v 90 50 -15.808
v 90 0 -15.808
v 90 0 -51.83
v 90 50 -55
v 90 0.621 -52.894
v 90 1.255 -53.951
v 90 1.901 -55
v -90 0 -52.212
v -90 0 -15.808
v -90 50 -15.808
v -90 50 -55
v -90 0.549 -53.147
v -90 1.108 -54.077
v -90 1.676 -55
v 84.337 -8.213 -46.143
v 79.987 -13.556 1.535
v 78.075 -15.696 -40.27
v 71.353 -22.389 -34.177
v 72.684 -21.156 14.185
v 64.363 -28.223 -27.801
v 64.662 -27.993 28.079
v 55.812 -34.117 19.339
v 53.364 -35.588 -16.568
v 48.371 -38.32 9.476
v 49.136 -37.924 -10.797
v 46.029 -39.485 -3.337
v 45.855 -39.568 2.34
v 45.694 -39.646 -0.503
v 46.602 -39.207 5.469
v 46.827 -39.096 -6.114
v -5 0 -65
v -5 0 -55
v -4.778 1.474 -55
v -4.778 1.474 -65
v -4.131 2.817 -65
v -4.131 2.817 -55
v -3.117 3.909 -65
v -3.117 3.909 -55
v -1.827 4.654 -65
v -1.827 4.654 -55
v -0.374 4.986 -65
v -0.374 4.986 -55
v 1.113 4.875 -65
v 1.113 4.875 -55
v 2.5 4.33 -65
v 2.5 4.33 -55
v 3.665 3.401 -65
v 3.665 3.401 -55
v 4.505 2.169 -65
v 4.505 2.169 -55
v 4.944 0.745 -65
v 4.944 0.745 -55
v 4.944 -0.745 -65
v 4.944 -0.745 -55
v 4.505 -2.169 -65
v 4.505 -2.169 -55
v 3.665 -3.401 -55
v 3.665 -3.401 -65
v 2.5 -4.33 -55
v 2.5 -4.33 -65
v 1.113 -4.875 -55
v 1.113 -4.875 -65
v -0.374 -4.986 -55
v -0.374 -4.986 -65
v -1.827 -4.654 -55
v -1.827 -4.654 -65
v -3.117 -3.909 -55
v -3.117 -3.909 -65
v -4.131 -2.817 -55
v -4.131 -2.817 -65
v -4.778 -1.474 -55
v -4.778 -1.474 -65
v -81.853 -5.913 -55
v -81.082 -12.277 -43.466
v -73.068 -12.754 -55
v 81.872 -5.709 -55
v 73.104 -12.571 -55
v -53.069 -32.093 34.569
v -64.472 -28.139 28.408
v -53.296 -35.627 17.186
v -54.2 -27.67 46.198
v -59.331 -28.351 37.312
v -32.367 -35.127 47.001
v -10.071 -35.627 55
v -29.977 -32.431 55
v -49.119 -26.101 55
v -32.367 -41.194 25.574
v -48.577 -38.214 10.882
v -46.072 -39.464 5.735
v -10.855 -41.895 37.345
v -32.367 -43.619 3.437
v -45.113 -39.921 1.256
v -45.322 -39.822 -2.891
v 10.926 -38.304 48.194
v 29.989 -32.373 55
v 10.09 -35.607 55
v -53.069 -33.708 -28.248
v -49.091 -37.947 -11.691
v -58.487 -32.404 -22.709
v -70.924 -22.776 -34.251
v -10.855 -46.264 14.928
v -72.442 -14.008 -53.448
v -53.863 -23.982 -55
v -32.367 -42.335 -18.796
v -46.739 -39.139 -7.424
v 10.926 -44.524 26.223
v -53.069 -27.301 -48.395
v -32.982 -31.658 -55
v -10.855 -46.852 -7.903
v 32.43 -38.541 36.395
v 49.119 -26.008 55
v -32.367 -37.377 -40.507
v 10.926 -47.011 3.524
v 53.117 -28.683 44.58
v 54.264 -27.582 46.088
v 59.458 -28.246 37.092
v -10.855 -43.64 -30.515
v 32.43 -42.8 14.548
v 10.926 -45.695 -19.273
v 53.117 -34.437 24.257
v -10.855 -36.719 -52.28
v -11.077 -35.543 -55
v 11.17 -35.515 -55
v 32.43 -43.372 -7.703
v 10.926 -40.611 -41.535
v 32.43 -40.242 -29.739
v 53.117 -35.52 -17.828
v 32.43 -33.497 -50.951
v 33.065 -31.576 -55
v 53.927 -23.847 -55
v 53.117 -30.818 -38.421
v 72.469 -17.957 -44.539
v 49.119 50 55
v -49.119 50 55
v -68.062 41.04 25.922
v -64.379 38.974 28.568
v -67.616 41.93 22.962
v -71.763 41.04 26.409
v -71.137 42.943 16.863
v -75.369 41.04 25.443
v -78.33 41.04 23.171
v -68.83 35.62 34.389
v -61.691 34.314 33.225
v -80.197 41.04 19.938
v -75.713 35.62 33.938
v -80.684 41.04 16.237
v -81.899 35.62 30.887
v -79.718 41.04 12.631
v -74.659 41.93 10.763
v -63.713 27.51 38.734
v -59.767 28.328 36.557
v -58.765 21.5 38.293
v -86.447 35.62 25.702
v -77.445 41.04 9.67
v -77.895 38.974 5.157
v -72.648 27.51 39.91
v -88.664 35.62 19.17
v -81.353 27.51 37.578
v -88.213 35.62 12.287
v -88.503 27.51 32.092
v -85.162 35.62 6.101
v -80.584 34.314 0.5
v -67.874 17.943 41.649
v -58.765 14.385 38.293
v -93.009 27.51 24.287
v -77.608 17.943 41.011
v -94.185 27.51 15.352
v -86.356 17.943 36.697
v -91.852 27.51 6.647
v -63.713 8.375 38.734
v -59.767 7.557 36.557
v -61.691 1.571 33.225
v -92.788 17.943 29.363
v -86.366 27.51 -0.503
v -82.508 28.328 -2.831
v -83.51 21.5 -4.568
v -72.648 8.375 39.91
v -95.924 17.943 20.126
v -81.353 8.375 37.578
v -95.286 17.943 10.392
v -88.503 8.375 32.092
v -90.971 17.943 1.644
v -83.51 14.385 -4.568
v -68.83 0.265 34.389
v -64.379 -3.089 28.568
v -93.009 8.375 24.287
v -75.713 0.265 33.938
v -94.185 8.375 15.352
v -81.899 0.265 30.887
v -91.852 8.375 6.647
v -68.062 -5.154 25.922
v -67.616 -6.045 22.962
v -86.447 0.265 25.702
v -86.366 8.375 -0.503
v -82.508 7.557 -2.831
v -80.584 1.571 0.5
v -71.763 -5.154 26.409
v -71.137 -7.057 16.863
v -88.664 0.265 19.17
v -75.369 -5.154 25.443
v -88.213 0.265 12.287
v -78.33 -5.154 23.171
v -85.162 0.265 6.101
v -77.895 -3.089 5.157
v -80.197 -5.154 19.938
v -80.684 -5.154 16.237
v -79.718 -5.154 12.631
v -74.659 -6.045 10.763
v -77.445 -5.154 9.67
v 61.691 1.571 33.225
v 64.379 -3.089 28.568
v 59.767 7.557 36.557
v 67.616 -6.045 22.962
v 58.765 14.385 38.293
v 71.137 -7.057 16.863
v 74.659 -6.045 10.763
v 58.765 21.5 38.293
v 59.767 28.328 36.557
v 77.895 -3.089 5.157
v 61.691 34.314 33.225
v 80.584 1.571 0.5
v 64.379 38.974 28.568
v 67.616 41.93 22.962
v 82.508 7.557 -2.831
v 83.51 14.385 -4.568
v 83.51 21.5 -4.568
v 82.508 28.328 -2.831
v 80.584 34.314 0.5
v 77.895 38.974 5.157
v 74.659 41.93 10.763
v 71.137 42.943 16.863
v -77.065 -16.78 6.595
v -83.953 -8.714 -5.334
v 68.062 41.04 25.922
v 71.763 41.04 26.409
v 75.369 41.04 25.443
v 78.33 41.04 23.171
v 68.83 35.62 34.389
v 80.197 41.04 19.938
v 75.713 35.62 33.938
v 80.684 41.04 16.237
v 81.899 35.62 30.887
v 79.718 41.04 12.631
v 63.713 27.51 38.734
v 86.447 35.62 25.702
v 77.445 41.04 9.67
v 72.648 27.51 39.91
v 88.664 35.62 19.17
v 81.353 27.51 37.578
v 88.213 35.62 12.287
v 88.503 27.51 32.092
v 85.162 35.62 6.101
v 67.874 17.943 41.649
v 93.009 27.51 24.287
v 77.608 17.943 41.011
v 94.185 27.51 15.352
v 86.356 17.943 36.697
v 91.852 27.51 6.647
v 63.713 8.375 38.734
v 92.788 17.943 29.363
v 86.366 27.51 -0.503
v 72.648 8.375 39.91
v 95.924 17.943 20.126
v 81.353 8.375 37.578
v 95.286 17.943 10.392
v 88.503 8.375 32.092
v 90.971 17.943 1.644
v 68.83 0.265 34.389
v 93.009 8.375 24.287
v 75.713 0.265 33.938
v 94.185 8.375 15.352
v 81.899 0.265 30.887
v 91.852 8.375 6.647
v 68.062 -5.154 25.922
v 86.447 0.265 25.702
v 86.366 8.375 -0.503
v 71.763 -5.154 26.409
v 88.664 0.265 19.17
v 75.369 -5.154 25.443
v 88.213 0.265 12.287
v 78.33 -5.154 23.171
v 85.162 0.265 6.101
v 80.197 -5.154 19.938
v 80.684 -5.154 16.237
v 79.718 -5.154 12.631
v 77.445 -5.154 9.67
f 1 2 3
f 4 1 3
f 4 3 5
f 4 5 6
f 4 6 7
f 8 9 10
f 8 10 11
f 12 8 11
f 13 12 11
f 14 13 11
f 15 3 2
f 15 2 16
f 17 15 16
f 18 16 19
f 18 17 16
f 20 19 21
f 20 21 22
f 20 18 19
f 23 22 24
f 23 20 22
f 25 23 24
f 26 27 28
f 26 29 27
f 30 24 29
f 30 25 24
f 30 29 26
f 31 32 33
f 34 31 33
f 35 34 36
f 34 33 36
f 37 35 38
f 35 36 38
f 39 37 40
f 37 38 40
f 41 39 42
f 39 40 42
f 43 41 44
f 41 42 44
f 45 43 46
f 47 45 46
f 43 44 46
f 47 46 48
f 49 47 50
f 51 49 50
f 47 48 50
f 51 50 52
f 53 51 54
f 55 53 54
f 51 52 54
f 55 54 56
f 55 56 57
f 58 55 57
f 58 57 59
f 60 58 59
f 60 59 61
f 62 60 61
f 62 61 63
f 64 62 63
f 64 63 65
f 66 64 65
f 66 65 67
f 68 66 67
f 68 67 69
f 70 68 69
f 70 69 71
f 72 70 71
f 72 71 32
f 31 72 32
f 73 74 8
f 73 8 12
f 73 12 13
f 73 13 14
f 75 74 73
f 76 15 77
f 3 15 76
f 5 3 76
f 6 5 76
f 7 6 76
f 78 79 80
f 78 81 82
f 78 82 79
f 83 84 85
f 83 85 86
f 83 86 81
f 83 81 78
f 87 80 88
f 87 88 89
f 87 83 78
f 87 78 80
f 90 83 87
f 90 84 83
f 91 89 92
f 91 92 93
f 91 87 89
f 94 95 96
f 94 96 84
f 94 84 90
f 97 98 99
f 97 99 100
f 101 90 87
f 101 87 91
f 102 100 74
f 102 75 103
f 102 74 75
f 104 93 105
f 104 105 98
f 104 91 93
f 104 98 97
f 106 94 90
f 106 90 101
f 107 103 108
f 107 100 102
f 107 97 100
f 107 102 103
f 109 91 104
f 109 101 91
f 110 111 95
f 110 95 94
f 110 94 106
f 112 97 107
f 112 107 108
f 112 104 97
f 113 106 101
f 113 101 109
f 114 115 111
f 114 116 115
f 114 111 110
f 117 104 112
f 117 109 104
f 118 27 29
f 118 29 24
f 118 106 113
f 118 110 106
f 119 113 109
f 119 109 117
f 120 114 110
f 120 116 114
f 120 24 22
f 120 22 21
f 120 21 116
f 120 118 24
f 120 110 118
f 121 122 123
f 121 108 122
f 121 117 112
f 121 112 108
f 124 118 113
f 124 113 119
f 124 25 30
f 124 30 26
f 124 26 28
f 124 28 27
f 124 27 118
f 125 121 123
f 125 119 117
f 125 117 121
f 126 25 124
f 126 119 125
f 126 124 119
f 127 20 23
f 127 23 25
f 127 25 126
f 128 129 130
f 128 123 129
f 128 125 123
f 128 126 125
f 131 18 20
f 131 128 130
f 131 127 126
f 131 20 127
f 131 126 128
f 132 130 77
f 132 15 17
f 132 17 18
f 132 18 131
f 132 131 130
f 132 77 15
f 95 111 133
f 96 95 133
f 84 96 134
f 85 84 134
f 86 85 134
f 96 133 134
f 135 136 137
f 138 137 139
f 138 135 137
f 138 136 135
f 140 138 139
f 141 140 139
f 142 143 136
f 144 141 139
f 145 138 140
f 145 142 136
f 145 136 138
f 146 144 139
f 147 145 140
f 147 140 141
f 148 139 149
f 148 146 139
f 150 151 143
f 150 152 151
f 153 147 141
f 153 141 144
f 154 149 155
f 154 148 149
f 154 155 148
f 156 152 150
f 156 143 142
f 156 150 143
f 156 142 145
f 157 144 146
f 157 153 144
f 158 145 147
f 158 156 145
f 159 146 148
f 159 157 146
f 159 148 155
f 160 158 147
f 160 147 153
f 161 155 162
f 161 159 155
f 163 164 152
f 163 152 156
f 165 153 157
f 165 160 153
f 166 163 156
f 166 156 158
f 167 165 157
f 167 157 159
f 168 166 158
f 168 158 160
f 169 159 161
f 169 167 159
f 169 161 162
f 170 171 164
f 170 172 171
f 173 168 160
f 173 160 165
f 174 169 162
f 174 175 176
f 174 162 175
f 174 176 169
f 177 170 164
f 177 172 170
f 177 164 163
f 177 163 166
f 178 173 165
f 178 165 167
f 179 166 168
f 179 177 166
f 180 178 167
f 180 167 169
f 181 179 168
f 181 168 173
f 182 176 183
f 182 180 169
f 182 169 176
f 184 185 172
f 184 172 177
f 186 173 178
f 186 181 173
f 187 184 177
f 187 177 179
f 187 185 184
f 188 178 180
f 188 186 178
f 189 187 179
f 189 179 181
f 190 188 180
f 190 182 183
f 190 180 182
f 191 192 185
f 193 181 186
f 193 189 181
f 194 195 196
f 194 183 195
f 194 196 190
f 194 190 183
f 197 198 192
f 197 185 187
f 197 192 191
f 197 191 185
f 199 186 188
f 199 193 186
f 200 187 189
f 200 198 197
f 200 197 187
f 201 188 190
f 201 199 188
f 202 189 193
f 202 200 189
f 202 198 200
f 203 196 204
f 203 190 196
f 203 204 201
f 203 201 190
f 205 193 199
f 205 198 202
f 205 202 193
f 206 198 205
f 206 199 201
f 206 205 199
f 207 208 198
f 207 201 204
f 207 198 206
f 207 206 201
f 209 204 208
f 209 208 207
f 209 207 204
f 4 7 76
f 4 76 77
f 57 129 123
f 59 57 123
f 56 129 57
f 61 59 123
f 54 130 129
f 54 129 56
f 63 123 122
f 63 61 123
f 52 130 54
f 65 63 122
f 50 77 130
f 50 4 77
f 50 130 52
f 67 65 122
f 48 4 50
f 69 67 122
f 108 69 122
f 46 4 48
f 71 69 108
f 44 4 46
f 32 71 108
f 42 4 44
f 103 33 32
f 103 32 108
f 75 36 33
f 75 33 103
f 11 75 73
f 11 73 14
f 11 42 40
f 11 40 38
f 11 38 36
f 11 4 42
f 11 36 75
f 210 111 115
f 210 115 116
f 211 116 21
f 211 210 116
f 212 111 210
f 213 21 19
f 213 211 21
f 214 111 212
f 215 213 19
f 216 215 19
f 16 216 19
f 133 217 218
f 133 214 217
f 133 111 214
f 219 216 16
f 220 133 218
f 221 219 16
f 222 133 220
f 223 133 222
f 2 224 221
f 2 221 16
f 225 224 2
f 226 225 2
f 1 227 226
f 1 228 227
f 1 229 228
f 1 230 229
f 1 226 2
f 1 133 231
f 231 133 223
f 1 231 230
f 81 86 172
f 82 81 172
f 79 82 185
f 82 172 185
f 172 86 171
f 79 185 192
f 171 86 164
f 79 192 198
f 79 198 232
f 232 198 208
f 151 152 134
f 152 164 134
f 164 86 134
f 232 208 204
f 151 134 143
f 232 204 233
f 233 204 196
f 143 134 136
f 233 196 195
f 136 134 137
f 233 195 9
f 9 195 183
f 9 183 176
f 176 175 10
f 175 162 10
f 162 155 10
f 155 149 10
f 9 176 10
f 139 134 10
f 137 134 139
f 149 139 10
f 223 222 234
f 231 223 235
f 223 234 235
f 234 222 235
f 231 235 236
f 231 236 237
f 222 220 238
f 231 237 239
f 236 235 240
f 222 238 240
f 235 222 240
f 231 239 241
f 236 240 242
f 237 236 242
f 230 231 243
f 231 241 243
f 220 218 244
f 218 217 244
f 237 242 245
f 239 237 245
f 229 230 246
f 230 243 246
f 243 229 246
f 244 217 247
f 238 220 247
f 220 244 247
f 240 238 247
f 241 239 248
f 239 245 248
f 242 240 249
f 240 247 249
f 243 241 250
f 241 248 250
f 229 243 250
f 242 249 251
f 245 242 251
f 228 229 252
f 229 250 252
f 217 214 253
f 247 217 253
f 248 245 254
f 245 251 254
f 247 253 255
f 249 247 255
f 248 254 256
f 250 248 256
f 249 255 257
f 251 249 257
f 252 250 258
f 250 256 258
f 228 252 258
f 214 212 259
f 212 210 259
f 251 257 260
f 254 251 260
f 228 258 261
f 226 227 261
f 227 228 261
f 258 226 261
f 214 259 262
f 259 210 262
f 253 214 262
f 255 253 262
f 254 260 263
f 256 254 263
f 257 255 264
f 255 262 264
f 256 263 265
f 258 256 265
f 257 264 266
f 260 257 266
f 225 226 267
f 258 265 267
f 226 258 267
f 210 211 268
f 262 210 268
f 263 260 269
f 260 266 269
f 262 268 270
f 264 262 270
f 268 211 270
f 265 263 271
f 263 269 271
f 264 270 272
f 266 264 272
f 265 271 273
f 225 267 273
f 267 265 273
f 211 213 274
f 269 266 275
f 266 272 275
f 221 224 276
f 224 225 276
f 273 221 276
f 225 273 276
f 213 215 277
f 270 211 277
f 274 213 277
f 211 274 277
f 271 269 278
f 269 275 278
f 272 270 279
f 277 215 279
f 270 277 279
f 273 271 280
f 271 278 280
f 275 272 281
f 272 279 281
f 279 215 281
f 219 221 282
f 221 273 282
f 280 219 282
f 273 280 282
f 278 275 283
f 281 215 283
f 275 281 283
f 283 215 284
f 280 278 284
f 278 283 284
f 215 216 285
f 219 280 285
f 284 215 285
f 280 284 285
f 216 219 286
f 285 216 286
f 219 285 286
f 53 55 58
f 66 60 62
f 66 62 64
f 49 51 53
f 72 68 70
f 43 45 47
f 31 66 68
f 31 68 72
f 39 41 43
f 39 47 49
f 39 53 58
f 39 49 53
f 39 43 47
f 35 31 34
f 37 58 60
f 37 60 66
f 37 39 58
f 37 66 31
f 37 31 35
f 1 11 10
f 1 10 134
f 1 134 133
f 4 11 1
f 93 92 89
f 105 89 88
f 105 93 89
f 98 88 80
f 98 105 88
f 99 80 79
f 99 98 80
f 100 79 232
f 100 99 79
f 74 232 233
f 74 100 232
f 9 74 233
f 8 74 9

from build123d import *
from build123d.topology import SkipClean

# Parameters (mm, degrees)
SKETCH1_W                = 180
SKETCH1_H                = 110
BOSS_EXTRUDE1_DEPTH      = 50
BOSS_EXTRUDE2_DEPTH      = 110
CUT_EXTRUDE1_DEPTH       = 146.344418537
BOSS_EXTRUDE5_DEPTH      = 10
BOSS_EXTRUDE5_DEPTH_BACK = 10
SKETCH5_R                = 5


with BuildPart() as part:
    # Sketch1 → Boss-Extrude1 (new body)
    with BuildSketch(Plane(origin=(0, 0, 0), x_dir=(1, 0, 0), z_dir=(0, 1, 0))):
        Rectangle(SKETCH1_W, SKETCH1_H)
    extrude(amount=BOSS_EXTRUDE1_DEPTH)

    # Sketch2 → Boss-Extrude2 (add)
    with BuildSketch(Plane(origin=(-35, 0, -55), x_dir=(1, 0, 0), z_dir=(0, 0, 1))):
        with BuildLine():
            Line((-55, 0), (125, 0))
            ThreePointArc((125, 0), (35, -50), (-55, 0))
        make_face()
    extrude(amount=BOSS_EXTRUDE2_DEPTH)

    # Sketch3 → Cut-Extrude1 (cut, through all)
    with BuildSketch(Plane(origin=(0, 50, 0), x_dir=(1, 0, 0), z_dir=(0, 1, 0))):
        Polygon((-49.118803686, -55), (-90, 15.808309091), (-90, -55), align=None)
    cut_extrude1 = extrude(amount=-CUT_EXTRUDE1_DEPTH, mode=Mode.SUBTRACT)

    # Mirror1: Cut-Extrude1 across plane
    add(cut_extrude1.mirror(Plane(origin=(0, 0, 0), x_dir=(0, 0, 1), z_dir=(1, 0, 0))), mode=Mode.SUBTRACT)

    # Sketch5 → Boss-Extrude5 (add, two sides: drawn at the far end of the back side and taken through both)
    with BuildSketch(Plane(origin=(0, 0, -55), x_dir=(-1, 0, 0), z_dir=(0, 0, -1)).offset(-BOSS_EXTRUDE5_DEPTH_BACK)):
        Circle(SKETCH5_R)
    extrude(amount=BOSS_EXTRUDE5_DEPTH + BOSS_EXTRUDE5_DEPTH_BACK)

    # Sketch4 → Revolve1 (revolve)
    with BuildSketch(Plane(origin=(-60.654801368, 0, 35.019065898), x_dir=(0.49999999999999495, 0, 0.8660254037844417), z_dir=(-0.8660254037844417, 0, 0.49999999999999495))):
        with BuildLine():
            ThreePointArc((-20.965161058, 42.942576489), (4.034838942, 17.942576489), (-20.965161058, -7.057423511))
            Line((-20.965161058, -7.057423511), (-20.965161058, 42.942576489))
        make_face()
    revolve1 = revolve(axis=Axis((-71.137381897, 42.942576489, 16.862703827), (0, -1, 0)))

    # Mirror2: Revolve1 across plane
    add(revolve1.mirror(Plane(origin=(0, 0, 0), x_dir=(0, 0, 1), z_dir=(1, 0, 0))))


with BuildPart() as body_2:
    # Sketch6 → Revolve2 (revolve)
    with SkipClean():  # the faces are left unmerged after this step: merging them gives an invalid solid
        with BuildSketch(Plane.XY):
            with BuildLine():
                ThreePointArc((137.389580355, 89.999956455), (-0.110419645, 227.499956455), (-137.610419645, 89.999956455))
                Line((-137.610419645, 89.999956455), (137.389580355, 89.999956455))
            make_face()
            with BuildLine():
                Line((137.389580355, 89.999956455), (-137.610419645, 89.999956455))
                ThreePointArc((-137.610419645, 89.999956455), (-0.110419645, -47.500043545), (137.389580355, 89.999956455))
            make_face()
        revolve(axis=Axis((-137.610419645, 89.999956455, 0), (1, 0, 0)))
    add(body_2.part.scale(1), mode=Mode.REPLACE)  # the faces are merged on a copy

    # Intersect1: read off the stored shape, not the designer's step
    # Intersect1: intersect part
    add(part.part, mode=Mode.INTERSECT)


solid = body_2.part
